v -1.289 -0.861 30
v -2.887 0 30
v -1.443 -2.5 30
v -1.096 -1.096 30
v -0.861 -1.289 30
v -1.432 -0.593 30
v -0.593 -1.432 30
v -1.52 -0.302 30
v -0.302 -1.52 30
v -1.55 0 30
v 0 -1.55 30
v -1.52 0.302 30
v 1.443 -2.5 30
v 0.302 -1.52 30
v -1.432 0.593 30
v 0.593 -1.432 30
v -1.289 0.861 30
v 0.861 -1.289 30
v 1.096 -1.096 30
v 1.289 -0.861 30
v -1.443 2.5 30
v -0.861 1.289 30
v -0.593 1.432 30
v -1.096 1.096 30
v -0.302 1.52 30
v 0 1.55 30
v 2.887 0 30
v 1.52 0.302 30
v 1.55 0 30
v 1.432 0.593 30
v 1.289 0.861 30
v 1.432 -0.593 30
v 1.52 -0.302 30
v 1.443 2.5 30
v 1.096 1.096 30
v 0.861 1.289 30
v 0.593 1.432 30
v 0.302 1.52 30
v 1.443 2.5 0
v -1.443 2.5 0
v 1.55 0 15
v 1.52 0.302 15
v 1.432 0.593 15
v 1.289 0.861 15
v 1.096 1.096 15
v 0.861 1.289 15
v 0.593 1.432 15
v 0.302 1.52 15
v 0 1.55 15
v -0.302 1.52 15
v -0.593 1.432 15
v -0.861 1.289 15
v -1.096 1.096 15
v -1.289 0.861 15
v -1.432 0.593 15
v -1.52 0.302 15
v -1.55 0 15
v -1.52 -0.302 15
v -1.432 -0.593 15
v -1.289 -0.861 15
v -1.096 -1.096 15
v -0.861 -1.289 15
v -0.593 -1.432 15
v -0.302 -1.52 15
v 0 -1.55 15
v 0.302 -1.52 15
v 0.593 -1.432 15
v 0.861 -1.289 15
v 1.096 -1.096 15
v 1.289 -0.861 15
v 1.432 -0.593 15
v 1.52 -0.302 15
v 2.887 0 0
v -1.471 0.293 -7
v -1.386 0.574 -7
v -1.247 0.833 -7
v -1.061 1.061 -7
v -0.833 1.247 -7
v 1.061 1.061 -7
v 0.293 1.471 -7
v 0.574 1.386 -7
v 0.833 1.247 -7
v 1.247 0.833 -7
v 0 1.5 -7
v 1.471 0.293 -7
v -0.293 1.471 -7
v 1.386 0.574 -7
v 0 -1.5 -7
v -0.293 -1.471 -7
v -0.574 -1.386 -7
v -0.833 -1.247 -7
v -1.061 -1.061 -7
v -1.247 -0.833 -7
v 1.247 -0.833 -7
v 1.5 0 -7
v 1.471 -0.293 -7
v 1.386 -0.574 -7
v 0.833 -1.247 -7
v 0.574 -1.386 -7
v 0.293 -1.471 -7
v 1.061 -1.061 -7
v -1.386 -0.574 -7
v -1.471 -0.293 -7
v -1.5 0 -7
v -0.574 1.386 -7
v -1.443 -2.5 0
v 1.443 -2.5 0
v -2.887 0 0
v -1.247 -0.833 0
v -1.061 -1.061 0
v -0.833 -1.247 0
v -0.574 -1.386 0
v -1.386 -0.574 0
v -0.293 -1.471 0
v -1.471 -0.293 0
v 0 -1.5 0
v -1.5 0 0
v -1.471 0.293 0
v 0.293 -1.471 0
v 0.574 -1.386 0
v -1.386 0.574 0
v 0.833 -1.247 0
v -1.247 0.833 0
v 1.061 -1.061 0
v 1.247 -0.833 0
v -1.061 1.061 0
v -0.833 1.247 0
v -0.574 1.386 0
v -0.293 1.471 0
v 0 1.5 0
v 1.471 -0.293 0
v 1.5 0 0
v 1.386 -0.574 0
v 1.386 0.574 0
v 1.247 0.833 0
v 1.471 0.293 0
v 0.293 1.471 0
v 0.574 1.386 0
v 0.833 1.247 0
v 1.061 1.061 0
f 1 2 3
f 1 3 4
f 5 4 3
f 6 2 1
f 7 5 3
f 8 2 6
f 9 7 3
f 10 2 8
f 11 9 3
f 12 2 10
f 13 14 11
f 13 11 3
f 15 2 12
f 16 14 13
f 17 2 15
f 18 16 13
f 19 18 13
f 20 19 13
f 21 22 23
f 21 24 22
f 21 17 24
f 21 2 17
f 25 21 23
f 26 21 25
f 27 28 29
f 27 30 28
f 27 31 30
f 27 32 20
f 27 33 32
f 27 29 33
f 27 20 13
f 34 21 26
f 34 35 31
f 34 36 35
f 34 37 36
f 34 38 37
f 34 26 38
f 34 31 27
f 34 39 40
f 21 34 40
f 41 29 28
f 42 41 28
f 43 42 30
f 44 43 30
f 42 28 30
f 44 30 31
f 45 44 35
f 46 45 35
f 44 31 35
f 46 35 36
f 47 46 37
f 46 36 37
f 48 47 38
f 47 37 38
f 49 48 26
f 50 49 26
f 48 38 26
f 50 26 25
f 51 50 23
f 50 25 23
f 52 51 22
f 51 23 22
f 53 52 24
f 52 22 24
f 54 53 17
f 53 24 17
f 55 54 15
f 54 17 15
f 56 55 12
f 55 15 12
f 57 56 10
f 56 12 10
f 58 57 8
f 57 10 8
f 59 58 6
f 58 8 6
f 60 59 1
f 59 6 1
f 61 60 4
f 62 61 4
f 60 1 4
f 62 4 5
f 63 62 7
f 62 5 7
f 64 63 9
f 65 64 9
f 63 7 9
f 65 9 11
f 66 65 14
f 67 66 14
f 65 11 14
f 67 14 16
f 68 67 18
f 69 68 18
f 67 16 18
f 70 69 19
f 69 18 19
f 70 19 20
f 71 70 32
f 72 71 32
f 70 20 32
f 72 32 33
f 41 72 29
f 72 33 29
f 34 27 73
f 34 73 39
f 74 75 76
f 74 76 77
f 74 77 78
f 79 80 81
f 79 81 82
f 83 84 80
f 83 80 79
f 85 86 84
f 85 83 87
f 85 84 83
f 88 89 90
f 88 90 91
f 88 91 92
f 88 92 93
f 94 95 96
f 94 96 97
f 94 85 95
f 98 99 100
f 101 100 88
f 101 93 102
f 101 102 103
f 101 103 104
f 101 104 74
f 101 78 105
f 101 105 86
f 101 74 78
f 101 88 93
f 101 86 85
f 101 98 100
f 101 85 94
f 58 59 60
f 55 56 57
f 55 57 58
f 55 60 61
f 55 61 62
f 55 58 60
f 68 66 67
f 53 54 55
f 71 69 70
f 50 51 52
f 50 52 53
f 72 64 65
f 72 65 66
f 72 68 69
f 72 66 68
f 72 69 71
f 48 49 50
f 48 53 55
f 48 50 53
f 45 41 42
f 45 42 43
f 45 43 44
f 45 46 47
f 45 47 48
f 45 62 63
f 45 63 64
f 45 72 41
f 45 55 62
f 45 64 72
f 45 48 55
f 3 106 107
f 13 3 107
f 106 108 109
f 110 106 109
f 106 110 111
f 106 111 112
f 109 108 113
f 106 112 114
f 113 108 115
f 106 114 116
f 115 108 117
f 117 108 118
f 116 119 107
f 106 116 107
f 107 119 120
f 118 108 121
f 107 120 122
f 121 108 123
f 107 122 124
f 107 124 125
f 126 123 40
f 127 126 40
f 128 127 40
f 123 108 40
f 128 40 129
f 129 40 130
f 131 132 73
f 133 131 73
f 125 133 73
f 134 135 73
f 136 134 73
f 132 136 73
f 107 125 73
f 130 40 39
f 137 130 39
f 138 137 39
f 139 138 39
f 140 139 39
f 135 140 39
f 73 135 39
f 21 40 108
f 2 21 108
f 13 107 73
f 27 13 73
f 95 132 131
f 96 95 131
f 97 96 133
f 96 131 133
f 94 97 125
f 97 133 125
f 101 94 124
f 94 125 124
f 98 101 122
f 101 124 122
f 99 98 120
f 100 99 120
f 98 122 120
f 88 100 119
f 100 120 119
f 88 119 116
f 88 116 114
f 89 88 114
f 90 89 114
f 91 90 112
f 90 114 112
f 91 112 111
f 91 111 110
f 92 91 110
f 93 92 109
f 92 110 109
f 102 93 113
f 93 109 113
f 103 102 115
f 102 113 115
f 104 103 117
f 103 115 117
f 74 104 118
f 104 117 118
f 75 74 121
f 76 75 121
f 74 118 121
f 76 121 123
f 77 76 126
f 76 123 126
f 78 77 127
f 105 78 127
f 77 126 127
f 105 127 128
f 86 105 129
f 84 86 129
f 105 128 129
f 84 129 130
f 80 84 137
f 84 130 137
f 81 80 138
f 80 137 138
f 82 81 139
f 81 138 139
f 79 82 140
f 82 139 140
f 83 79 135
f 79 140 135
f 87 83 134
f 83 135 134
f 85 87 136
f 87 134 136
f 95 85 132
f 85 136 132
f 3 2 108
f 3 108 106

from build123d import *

# Parameters (mm, degrees)
PAD_DEPTH    = 30
SKETCH001_R  = 1.55
POCKET_DEPTH = 15
SKETCH002_R  = 1.5
PAD001_DEPTH = 7


with BuildPart() as part:
    # Sketch → Pad (new body)
    with BuildSketch(Plane.XY):
        Polygon((2.886751, 0), (1.443376, 2.5), (-1.443376, 2.5), (-2.886751, 0), (-1.443376, -2.5), (1.443376, -2.5), align=None)
    extrude(amount=PAD_DEPTH)

    # Sketch001 (on Face8 of Pad) → Pocket (cut)
    with BuildSketch(Plane.XY.offset(30)):
        Circle(SKETCH001_R)
    extrude(amount=-POCKET_DEPTH, mode=Mode.SUBTRACT)

    # Sketch002 (on Face4 of Pocket) → Pad001 (join)
    with BuildSketch(Plane(origin=(0, 0, 0), x_dir=(1, 0, 0), z_dir=(0, 0, -1))):
        Circle(SKETCH002_R)
    extrude(amount=PAD001_DEPTH)


solid = part.part
